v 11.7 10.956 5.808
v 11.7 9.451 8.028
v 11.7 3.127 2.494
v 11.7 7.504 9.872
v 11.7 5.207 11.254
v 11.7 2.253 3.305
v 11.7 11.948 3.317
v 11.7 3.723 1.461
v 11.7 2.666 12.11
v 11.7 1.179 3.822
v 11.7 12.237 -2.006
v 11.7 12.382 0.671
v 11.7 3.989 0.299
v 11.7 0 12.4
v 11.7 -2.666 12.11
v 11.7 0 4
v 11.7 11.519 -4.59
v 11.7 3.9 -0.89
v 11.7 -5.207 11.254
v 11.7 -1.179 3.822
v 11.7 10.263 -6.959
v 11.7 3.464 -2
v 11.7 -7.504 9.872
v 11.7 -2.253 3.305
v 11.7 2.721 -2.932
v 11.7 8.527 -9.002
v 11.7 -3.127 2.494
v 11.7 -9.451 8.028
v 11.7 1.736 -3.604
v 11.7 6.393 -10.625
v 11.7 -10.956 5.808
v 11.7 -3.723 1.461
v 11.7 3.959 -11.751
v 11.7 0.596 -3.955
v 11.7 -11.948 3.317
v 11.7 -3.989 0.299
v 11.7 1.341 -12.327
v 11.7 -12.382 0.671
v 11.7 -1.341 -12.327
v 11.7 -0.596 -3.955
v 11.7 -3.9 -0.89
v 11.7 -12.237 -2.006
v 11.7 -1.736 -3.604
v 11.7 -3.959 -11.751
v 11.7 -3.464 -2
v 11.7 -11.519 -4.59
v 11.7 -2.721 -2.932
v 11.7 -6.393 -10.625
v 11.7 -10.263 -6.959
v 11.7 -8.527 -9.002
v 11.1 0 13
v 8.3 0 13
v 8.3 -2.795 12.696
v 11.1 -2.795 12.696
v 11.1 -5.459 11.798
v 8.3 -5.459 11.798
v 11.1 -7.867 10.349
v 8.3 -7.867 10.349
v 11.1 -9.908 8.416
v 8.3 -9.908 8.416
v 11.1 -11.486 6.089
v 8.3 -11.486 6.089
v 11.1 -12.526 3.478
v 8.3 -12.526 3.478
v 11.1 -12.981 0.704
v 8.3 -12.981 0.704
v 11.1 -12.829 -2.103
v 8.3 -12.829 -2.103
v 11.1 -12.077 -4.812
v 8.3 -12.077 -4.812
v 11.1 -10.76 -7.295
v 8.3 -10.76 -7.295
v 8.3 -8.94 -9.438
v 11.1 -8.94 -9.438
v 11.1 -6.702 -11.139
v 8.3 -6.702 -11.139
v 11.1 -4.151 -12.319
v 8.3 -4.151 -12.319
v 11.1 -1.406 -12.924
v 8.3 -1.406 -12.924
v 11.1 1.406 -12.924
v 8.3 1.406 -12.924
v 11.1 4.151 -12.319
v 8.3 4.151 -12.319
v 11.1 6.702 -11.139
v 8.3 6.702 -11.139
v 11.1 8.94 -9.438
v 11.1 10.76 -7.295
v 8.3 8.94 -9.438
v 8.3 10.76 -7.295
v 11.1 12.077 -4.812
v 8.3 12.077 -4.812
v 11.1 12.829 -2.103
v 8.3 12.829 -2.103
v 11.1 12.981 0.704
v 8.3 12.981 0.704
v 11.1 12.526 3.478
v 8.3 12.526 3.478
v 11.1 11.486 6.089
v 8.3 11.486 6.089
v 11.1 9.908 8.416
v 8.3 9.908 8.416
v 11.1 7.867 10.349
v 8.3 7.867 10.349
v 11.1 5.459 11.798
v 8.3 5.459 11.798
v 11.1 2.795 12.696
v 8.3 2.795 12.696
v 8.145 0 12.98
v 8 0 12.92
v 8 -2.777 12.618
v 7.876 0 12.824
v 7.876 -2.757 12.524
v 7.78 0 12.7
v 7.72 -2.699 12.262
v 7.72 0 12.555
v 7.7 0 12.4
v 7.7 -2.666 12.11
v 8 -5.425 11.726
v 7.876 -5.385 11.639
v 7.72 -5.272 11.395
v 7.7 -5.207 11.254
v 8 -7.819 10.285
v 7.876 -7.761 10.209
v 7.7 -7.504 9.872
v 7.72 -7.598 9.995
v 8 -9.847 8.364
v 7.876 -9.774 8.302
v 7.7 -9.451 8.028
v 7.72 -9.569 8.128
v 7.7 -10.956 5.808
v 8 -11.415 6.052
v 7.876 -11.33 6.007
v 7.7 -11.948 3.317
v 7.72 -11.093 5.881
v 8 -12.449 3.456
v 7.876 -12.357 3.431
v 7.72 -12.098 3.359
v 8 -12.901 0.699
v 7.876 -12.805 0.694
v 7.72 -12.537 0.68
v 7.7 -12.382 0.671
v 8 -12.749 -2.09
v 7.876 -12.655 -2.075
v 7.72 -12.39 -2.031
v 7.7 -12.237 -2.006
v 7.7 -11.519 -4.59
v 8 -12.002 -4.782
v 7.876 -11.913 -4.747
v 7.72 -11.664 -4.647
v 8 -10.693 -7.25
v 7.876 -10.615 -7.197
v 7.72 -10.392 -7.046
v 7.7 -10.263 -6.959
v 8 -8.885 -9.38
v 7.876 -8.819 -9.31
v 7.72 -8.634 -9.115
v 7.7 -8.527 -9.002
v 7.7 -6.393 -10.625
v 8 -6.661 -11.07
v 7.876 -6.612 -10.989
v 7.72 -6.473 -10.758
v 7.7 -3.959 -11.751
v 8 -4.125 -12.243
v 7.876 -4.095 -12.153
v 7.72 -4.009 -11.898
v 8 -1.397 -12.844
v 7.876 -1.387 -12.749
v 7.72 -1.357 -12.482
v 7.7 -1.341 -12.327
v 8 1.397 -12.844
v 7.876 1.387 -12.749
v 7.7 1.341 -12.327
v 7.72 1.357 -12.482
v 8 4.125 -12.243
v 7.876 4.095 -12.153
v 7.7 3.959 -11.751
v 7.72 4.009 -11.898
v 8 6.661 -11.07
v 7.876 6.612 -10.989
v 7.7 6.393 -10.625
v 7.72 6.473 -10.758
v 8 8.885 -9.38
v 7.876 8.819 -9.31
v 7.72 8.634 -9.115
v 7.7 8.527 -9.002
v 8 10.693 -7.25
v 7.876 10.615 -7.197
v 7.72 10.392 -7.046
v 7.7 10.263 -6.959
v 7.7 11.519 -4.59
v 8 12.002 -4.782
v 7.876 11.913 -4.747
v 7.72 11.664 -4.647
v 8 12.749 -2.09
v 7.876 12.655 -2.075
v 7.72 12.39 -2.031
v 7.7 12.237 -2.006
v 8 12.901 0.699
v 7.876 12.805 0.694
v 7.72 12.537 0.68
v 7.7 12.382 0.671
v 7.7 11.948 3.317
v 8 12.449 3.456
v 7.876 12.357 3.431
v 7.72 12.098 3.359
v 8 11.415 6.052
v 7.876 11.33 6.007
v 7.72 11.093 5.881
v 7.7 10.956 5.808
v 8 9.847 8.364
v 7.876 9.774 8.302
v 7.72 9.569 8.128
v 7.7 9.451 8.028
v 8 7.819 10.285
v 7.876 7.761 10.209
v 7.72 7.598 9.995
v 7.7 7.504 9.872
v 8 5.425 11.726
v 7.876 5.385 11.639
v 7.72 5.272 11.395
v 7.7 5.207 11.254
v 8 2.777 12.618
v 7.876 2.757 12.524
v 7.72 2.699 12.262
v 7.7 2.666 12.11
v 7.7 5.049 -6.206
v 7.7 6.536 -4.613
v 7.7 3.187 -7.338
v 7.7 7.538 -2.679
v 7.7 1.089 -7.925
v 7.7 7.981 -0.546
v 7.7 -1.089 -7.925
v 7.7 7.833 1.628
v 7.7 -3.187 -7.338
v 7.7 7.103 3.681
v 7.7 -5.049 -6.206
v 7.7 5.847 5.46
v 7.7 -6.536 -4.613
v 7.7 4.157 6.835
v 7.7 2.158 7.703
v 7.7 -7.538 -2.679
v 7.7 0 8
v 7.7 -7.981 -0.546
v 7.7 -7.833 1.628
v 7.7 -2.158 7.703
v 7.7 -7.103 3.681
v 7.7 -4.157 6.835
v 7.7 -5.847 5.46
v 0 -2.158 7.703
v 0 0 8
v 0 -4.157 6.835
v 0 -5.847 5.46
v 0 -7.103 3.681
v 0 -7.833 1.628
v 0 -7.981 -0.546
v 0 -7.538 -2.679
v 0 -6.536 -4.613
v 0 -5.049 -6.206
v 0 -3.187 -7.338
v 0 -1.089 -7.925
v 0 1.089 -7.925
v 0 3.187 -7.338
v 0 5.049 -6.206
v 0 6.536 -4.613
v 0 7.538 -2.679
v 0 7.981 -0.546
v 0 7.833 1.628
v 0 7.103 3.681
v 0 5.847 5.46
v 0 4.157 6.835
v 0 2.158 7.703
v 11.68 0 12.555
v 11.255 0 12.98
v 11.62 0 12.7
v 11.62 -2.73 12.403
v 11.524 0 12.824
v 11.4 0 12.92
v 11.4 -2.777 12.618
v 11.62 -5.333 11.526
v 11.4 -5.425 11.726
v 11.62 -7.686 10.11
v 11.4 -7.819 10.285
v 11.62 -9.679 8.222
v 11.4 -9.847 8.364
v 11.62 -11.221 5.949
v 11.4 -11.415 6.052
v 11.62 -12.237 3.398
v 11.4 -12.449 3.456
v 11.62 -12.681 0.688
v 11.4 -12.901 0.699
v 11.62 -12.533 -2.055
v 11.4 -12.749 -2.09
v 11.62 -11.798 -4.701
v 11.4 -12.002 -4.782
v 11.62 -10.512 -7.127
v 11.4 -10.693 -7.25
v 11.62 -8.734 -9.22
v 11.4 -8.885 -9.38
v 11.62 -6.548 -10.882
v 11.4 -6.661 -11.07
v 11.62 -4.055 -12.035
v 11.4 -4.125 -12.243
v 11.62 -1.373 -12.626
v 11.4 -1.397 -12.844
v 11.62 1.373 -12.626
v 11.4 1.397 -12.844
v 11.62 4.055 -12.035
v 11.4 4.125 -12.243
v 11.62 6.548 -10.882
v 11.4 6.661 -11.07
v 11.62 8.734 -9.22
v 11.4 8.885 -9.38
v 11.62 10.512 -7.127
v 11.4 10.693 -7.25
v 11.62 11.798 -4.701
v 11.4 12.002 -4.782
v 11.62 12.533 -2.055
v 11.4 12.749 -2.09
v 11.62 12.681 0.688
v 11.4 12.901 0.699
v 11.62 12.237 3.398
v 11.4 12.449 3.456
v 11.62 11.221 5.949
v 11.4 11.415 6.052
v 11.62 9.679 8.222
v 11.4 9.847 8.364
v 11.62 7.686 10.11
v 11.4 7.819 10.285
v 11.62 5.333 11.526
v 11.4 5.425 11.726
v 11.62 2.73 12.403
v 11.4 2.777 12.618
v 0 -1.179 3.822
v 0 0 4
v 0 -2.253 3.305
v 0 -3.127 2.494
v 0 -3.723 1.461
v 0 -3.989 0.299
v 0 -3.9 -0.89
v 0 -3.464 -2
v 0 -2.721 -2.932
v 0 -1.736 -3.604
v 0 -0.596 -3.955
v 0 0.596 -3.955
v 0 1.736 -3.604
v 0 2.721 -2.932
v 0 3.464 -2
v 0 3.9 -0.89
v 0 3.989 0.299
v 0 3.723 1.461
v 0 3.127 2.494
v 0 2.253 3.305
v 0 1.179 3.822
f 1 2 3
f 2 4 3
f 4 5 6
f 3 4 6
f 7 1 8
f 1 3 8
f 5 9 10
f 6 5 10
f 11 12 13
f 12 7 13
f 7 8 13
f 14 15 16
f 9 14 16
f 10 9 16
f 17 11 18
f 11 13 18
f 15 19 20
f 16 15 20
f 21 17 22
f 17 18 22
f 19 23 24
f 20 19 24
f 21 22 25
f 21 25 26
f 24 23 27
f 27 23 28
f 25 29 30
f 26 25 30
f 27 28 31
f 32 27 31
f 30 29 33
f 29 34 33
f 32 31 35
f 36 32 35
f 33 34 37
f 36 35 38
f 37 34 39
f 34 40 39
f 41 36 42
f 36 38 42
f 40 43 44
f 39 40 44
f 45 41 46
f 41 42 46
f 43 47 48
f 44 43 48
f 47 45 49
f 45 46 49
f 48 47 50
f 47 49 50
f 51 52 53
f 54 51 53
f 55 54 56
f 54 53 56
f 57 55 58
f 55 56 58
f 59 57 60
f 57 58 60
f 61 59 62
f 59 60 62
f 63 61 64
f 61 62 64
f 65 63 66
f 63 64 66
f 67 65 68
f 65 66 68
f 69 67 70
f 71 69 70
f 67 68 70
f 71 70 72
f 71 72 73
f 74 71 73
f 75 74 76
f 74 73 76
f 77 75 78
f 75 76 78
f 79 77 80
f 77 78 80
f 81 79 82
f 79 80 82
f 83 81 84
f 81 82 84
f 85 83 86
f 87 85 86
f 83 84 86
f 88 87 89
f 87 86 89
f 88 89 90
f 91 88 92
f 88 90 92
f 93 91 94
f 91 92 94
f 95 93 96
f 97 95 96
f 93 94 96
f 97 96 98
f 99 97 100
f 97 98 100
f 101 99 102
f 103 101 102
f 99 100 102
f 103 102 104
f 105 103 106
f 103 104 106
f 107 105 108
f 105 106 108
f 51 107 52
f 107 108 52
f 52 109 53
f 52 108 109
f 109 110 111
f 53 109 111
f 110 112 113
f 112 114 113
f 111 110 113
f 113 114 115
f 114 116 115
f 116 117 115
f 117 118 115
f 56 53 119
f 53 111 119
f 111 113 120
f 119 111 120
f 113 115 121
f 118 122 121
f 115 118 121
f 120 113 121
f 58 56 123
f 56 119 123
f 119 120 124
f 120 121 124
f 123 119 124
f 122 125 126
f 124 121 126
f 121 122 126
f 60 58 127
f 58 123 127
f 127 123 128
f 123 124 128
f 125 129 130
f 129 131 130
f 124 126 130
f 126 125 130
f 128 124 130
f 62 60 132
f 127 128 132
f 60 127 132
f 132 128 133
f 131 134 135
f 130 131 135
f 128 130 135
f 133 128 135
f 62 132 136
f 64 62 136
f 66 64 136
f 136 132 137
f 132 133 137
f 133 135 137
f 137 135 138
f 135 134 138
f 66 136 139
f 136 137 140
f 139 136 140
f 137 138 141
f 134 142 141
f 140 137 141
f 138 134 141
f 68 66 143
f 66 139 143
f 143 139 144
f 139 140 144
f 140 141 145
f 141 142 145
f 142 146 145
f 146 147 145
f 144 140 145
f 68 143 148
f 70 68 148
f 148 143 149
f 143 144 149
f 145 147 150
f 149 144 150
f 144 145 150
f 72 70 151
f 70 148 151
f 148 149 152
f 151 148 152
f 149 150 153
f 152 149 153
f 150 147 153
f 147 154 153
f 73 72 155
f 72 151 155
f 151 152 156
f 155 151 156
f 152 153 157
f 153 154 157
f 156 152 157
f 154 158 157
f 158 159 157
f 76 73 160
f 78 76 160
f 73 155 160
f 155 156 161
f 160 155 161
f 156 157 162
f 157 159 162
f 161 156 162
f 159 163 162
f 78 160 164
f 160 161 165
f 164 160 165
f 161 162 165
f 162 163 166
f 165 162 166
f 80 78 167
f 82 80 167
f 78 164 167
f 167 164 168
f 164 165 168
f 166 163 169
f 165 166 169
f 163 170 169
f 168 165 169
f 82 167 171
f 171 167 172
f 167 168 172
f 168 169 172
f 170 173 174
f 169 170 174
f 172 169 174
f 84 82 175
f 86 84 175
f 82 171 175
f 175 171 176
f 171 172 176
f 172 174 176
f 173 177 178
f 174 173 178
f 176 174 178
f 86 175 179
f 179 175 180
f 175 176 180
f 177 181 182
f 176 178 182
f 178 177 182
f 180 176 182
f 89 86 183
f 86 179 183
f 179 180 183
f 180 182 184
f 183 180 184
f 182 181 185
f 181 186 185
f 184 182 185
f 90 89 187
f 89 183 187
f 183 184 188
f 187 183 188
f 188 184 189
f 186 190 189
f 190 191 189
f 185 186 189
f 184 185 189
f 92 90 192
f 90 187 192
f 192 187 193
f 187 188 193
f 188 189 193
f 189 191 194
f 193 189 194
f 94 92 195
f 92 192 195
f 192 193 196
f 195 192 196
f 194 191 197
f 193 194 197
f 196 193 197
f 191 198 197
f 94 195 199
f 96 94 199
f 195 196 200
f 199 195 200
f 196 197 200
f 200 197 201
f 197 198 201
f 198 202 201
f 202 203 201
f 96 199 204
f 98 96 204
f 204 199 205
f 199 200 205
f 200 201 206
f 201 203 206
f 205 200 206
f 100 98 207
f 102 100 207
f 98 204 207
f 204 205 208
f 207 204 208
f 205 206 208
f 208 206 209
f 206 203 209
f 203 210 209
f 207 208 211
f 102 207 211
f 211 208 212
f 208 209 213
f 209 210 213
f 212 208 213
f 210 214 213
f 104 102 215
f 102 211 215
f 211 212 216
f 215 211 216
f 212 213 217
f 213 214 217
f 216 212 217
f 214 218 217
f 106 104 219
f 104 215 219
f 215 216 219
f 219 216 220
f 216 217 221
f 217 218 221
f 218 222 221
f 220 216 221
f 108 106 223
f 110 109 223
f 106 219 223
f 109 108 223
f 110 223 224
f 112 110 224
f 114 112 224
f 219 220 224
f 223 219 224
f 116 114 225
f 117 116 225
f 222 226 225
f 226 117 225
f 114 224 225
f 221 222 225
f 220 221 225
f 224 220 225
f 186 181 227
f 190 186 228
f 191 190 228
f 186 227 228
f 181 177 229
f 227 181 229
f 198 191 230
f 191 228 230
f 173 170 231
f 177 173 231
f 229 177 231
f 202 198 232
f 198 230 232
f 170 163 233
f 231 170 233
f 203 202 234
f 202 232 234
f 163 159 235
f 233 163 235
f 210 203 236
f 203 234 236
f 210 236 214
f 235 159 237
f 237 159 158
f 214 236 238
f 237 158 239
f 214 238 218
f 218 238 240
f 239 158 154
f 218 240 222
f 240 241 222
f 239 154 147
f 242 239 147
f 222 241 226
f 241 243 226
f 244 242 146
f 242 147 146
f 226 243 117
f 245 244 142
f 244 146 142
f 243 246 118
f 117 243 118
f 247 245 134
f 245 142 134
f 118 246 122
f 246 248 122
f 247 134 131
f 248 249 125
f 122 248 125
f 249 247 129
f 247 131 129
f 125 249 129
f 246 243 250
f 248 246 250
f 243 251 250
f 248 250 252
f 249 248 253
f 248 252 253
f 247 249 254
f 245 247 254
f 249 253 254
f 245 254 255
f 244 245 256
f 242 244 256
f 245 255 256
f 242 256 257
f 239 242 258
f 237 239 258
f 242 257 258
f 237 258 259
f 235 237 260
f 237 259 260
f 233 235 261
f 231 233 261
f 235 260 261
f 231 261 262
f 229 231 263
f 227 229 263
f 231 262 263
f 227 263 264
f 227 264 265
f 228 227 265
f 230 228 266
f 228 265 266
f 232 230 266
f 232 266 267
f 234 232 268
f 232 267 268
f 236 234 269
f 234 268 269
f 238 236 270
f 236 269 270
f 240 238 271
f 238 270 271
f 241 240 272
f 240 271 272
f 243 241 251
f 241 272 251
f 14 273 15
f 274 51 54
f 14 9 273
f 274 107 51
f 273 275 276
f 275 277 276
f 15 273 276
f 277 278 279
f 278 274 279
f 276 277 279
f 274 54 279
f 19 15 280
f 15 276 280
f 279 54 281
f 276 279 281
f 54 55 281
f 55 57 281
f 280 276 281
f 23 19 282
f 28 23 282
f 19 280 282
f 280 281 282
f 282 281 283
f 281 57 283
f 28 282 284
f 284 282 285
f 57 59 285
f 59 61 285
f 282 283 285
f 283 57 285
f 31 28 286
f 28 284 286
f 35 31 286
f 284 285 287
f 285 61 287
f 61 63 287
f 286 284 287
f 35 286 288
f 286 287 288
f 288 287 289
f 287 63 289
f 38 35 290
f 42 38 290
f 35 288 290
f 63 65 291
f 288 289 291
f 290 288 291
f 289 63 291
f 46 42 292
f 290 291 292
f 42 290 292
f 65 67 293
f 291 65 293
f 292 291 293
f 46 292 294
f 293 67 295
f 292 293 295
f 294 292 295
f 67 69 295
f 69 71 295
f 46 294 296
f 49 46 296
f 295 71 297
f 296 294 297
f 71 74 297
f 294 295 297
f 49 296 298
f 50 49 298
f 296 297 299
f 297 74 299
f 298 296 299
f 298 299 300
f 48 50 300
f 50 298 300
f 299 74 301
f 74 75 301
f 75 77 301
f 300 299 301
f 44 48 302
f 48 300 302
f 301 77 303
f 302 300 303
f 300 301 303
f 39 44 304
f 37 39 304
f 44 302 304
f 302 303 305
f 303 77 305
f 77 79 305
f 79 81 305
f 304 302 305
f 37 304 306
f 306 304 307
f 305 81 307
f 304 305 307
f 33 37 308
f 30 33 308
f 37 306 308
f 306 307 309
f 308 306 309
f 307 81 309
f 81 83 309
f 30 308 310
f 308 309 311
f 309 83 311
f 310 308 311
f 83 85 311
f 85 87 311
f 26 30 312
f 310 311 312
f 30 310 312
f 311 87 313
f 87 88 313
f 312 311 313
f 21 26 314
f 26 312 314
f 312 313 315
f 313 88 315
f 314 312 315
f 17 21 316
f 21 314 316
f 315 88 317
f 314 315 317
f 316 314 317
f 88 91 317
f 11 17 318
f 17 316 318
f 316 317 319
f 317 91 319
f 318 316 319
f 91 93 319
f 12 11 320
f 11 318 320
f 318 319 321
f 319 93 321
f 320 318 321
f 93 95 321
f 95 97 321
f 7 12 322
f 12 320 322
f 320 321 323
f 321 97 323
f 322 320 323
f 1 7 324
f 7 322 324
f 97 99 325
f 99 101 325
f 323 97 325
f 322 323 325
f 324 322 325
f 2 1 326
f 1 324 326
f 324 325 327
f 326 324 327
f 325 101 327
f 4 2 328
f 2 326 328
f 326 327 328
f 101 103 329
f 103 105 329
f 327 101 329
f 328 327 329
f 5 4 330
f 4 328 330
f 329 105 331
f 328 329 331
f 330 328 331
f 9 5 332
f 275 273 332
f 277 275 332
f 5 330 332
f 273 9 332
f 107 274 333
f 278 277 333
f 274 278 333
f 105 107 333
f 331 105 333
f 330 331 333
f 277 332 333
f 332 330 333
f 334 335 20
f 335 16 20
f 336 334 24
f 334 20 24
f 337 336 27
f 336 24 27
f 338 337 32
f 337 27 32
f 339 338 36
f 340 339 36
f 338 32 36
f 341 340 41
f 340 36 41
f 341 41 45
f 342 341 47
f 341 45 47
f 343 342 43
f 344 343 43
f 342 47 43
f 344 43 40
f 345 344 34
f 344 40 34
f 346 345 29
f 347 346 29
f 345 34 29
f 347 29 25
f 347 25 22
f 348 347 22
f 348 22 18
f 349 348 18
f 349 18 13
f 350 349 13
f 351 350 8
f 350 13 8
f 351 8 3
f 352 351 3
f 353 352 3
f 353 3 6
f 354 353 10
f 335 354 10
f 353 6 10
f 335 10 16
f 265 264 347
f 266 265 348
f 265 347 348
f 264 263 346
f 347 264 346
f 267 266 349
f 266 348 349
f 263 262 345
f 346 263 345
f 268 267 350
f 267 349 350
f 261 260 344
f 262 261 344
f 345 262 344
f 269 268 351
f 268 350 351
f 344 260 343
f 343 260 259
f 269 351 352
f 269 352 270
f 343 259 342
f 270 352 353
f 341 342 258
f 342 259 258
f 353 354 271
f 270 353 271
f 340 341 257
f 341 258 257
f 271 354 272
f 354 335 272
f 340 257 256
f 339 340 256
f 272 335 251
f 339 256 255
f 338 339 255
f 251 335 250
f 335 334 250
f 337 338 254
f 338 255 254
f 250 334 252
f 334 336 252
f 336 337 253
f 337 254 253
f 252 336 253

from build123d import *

# Parameters (mm, degrees)
CONG_1_R = 0.6


with BuildPart() as part:
    # Esquisse1 → Révolution1 (revolve)
    with BuildSketch(Plane.XY, mode=Mode.PRIVATE) as r_volution1_sk:
        Polygon((0, 4), (11.7, 4), (11.7, 13), (7.7, 13), (7.7, 8), (0, 8), align=None)
    revolve(r_volution1_sk.sketch.rotate(Axis((0, 0, 0), (1, 0, 0)), 90), axis=Axis((0, 0, 0), (1, 0, 0)))

    # Congé1
    cong_1_edges = [part.edges().sort_by_distance(p)[0] for p in [
        (7.7, 0, -13),
        (11.7, 0, -13),
    ]]
    fillet(cong_1_edges, radius=CONG_1_R)


solid = part.part
